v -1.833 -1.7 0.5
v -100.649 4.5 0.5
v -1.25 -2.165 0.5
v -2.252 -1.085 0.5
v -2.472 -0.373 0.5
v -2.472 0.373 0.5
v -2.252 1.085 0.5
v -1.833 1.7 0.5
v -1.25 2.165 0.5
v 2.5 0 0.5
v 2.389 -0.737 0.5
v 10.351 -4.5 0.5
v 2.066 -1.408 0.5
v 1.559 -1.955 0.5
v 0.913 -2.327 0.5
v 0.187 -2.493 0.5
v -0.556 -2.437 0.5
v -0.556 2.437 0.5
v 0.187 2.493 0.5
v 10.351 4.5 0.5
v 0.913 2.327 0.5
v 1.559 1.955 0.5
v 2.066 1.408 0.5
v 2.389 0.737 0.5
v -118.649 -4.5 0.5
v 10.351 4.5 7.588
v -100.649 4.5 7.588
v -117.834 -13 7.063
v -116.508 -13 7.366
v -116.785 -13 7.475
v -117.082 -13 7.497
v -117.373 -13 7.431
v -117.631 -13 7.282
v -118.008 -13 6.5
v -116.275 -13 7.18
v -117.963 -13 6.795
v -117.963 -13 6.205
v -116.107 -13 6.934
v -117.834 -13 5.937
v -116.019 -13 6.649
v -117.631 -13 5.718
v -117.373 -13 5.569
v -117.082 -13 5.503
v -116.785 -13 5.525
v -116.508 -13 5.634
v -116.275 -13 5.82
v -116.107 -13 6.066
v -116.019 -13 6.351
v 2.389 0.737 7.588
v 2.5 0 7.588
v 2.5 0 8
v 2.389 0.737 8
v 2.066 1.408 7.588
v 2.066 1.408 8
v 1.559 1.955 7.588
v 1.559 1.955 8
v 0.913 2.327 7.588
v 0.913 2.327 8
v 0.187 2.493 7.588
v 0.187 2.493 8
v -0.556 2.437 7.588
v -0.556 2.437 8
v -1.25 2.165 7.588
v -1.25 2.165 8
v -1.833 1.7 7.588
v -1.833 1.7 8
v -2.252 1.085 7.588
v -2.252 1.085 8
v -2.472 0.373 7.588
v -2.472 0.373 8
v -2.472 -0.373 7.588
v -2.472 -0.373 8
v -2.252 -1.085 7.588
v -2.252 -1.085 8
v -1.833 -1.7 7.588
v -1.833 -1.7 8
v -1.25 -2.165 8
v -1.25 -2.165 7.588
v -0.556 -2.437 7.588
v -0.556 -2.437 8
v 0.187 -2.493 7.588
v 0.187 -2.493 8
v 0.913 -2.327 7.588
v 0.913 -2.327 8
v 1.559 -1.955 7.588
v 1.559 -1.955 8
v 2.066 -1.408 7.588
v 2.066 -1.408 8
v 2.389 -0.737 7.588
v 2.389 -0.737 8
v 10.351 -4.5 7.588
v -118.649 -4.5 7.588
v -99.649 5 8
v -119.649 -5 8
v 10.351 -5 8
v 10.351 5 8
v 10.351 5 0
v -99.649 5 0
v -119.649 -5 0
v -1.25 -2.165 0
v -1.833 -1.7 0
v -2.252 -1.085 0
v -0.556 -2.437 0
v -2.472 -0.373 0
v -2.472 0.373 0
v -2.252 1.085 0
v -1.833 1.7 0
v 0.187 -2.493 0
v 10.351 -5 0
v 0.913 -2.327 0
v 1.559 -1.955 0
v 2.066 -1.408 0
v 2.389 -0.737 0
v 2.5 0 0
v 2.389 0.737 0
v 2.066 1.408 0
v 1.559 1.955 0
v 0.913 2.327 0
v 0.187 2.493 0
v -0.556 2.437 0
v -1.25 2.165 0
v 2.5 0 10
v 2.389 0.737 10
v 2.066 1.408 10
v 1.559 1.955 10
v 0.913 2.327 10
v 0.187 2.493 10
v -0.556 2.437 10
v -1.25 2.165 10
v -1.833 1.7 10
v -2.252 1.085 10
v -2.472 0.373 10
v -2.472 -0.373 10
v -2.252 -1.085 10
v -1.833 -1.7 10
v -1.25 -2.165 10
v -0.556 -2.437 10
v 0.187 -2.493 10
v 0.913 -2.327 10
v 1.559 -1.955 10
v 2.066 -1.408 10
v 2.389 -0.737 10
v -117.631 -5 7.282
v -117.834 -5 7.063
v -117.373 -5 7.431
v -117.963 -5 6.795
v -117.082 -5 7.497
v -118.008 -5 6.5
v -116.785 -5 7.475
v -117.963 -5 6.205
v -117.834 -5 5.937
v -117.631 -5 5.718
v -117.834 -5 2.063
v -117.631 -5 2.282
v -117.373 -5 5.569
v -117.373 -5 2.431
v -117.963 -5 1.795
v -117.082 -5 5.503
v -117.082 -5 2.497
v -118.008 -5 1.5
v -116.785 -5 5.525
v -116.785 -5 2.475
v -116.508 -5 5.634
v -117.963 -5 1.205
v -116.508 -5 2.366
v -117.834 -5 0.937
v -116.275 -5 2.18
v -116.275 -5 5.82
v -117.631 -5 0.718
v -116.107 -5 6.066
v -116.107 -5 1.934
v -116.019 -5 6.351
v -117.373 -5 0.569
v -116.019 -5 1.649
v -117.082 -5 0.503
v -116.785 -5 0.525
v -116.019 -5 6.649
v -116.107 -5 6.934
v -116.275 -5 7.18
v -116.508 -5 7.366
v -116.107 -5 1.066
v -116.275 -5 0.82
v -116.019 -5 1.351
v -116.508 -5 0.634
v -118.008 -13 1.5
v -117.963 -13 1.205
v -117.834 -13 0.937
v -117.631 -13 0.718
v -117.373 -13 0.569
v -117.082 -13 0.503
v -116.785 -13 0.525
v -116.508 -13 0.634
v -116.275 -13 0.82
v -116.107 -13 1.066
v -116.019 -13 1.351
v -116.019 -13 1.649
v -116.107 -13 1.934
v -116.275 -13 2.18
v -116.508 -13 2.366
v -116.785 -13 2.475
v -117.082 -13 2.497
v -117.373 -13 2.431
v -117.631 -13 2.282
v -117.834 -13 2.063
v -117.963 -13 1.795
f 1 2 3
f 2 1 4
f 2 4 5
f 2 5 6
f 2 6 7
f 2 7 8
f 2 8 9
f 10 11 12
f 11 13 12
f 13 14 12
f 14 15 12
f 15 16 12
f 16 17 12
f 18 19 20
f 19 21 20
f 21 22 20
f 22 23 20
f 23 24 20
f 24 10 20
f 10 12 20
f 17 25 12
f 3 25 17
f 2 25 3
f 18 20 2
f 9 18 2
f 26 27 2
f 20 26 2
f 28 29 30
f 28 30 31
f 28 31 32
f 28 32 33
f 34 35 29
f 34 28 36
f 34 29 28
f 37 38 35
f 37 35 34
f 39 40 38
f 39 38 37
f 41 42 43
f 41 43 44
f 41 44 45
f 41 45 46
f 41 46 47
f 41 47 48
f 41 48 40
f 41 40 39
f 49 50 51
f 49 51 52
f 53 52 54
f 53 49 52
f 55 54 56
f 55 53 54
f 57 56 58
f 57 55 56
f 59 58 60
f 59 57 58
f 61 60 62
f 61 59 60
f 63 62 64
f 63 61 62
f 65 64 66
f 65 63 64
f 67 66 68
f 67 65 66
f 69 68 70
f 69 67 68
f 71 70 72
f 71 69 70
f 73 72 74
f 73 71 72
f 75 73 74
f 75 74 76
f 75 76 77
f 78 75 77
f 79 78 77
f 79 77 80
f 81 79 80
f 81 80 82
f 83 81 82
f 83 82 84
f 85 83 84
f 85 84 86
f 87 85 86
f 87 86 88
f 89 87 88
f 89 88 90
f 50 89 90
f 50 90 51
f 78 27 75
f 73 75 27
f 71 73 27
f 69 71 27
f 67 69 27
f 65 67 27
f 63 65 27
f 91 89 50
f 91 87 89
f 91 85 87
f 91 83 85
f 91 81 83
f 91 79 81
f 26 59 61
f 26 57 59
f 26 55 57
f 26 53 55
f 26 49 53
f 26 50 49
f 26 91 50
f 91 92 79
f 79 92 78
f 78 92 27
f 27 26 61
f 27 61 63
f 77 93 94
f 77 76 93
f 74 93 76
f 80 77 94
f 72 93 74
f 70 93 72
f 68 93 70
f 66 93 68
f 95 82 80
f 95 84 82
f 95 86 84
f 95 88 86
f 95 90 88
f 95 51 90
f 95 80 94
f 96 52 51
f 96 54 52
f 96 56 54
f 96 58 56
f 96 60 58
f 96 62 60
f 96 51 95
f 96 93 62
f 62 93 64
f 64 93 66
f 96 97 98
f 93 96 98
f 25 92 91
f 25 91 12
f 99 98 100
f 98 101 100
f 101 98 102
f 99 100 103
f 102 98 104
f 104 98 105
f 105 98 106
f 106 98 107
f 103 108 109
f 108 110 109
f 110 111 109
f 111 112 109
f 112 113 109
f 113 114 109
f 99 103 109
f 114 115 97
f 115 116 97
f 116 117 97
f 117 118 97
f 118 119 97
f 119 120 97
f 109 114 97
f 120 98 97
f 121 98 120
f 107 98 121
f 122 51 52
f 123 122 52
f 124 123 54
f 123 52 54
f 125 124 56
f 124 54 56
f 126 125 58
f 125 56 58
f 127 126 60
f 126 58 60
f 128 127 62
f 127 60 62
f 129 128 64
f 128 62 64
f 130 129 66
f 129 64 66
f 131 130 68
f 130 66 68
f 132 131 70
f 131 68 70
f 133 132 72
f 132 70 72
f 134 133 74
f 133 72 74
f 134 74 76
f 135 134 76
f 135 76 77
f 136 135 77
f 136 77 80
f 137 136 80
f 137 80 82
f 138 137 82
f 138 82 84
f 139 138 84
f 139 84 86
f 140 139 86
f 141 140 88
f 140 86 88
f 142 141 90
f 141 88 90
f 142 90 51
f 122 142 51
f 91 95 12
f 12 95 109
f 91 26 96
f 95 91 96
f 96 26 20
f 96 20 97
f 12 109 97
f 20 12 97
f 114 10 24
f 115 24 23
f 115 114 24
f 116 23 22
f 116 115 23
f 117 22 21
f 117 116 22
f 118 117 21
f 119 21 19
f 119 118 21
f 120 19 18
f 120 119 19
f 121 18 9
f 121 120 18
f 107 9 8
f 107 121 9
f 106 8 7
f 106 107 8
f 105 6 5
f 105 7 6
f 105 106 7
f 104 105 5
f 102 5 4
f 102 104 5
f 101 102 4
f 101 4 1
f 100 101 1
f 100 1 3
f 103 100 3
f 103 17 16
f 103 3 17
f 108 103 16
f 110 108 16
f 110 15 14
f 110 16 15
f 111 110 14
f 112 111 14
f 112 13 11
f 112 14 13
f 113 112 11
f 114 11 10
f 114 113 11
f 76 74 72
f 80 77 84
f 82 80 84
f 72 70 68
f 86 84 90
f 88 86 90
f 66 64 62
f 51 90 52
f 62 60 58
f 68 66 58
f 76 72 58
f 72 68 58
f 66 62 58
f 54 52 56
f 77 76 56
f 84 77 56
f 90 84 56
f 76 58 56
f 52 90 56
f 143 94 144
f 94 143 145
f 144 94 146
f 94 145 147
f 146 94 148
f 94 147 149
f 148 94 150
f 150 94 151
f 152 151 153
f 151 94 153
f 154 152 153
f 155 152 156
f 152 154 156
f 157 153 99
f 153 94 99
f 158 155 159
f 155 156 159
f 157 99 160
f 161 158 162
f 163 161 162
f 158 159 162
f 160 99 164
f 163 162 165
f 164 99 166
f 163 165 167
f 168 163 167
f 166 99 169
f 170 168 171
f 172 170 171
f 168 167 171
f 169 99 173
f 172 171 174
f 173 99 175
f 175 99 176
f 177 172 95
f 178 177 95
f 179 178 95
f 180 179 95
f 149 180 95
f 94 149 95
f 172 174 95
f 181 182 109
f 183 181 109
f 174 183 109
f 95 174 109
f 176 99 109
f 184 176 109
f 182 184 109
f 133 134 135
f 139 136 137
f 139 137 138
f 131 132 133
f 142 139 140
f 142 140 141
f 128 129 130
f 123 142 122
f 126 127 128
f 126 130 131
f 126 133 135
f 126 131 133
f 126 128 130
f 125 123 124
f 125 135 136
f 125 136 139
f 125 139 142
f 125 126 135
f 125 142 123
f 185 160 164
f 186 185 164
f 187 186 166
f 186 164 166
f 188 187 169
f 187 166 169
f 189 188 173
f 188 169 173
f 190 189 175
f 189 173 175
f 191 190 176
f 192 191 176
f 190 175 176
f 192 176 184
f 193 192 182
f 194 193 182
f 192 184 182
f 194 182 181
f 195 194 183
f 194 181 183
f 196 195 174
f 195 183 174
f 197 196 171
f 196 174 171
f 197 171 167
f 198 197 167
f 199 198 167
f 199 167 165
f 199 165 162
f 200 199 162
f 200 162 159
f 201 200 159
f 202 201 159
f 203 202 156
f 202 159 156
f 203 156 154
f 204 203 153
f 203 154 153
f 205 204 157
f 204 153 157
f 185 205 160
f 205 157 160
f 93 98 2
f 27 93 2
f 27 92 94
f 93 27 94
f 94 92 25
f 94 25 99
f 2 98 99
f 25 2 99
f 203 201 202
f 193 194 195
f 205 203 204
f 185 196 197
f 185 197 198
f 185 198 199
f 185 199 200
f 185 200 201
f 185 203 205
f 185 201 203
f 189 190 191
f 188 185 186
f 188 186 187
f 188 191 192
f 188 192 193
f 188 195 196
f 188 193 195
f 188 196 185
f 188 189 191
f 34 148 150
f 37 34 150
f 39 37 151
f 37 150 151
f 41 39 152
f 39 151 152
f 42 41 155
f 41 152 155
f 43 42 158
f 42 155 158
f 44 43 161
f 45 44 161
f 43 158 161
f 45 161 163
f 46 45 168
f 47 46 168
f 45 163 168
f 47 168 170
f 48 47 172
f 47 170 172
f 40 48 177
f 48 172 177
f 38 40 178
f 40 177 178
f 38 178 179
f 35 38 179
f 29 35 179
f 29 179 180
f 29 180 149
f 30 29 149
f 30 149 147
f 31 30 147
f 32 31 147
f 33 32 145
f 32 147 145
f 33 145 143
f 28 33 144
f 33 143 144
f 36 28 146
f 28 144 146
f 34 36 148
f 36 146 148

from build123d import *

# Parameters (mm, degrees)
ESQUISSE1_R             = 2.5
BOSS_EXTRU_1_DEPTH      = 8
ESQUISSE2_W             = 7.087737969
ESQUISSE2_H             = 9
ENL_V_MAT_EXTRU_1_DEPTH = 600
ESQUISSE3_R             = 2.5
BOSS_EXTRU_2_DEPTH      = 2
ESQUISSE4_R             = 1
BOSS_EXTRU_3_DEPTH      = 8


with BuildPart() as part:
    # Esquisse1 → Boss.-Extru.1 (new body)
    with BuildSketch(Plane.XY):
        Polygon((10.350579175, 0), (10.350579175, 5), (-99.649420825, 5), (-119.649420825, -5), (10.350579175, -5), align=None)
        Circle(ESQUISSE1_R, mode=Mode.SUBTRACT)
    extrude(amount=BOSS_EXTRU_1_DEPTH)

    # Esquisse2 → Enlèv. mat.-Extru.1 (cut)
    with BuildSketch(Plane(origin=(10.350579175, 0, 0), x_dir=(0, 0, -1), z_dir=(1, 0, 0))):
        with Locations((-4.043868985, 0)):
            Rectangle(ESQUISSE2_W, ESQUISSE2_H)
    extrude(amount=-ENL_V_MAT_EXTRU_1_DEPTH, mode=Mode.SUBTRACT)

    # Esquisse4 → Boss.-Extru.3 (add)
    with BuildSketch(Plane.XZ.offset(5)):
        with Locations(Location((-117.007626081, 6.5, 0), (0, 0, 180))):
            Circle(ESQUISSE4_R)
        with Locations(Location((-117.007626081, 1.5, 0), (0, 0, 180))):
            Circle(ESQUISSE4_R)
    extrude(amount=BOSS_EXTRU_3_DEPTH)


with BuildPart() as body_2:
    # Esquisse3 → Boss.-Extru.2 (new body)
    with BuildSketch(Plane.XY.offset(8)):
        Circle(ESQUISSE3_R)
    extrude(amount=BOSS_EXTRU_2_DEPTH)


solid = Compound([part.part, body_2.part])
